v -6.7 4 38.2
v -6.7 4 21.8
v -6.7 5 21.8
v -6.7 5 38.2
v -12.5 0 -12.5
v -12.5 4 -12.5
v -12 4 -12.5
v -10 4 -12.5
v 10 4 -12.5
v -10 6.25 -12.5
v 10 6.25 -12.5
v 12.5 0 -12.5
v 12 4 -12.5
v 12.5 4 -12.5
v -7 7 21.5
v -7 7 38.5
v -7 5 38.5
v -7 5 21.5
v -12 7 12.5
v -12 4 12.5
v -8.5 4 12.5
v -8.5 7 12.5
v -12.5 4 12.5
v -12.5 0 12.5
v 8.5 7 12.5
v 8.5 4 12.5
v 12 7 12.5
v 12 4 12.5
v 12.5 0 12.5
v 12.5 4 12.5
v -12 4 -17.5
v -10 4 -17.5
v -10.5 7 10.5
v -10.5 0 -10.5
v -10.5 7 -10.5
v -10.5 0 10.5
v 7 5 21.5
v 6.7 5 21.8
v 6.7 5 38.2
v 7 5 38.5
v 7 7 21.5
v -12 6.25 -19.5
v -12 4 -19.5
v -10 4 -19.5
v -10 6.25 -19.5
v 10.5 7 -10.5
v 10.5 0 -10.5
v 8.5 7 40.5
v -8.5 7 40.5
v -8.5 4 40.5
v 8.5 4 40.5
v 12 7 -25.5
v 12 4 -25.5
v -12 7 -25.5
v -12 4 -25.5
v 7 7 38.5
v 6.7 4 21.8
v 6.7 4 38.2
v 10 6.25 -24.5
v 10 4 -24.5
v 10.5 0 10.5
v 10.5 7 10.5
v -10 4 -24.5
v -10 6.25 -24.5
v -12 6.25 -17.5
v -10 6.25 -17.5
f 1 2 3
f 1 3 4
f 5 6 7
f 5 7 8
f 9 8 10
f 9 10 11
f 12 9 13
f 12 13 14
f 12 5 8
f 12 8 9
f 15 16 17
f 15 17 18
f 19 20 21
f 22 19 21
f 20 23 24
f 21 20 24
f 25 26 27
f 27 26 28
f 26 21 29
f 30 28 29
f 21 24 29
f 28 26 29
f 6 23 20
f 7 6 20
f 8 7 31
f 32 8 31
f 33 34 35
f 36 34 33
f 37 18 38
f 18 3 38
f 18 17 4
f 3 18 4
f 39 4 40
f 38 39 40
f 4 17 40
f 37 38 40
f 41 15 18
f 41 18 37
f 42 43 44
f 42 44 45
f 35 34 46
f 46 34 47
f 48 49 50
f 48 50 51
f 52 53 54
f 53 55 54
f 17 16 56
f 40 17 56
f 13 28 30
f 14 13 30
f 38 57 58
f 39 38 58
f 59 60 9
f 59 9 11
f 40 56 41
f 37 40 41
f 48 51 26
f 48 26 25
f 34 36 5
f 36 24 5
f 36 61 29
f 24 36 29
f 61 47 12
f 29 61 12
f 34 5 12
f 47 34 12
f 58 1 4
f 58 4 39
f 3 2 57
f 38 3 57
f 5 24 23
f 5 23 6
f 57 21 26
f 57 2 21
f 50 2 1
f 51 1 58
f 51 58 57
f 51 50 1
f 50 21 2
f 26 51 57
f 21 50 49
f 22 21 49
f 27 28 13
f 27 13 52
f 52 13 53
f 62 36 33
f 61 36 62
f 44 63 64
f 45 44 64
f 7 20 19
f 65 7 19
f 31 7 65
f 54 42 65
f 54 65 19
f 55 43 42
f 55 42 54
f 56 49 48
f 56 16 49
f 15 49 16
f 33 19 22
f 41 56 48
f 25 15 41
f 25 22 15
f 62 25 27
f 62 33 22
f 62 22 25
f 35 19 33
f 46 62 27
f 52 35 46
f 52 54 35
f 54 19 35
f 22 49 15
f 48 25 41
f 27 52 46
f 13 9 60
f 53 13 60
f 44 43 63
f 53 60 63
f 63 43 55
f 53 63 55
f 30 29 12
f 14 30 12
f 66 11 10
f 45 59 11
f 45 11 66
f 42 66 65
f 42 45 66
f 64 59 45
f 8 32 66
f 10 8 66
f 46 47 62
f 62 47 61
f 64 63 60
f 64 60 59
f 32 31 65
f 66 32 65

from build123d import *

# Parameters (mm, degrees)
SKETCH1_W           = 25
SKETCH1_H           = 25
BOSS_EXTRUDE1_DEPTH = 4
SKETCH2_W           = 24
SKETCH2_H           = 38
BOSS_EXTRUDE2_DEPTH = 3
SKETCH3_W           = 20
SKETCH3_H           = 2.25
CUT_EXTRUDE1_DEPTH  = 13
SKETCH4_W           = 17
SKETCH4_H           = 3
BOSS_EXTRUDE3_DEPTH = 28
CUT_EXTRUDE2_REACH  = 44.959
SKETCH5_W           = 14
SKETCH5_H           = 17
BOSS_EXTRUDE4_REACH = 48.856
SKETCH6_W           = 1
SKETCH6_H           = 2.25
CUT_EXTRUDE3_REACH  = 49.849
SKETCH7_W           = 2
SKETCH7_H           = 2.25
CUT_EXTRUDE4_REACH  = 44.959
SKETCH9_W           = 21
SKETCH9_H           = 21
SKETCH11_W          = 14
SKETCH11_H          = 17
SKETCH11_W_2        = 13.4
SKETCH11_H_2        = 16.4
BOSS_EXTRUDE5_DEPTH = 1


with BuildPart() as part:
    # Sketch1 → Boss-Extrude1 (new body)
    with BuildSketch(Plane(origin=(0, 0, 0), x_dir=(1, 0, 0), z_dir=(0, 1, 0))):
        Rectangle(SKETCH1_W, SKETCH1_H)
    extrude(amount=BOSS_EXTRUDE1_DEPTH)

    # Sketch2 → Boss-Extrude2 (add)
    with BuildSketch(Plane(origin=(0, 4, 0), x_dir=(1, 0, 0), z_dir=(0, 1, 0))):
        with Locations((0, 6.5)):
            Rectangle(SKETCH2_W, SKETCH2_H)
    extrude(amount=BOSS_EXTRUDE2_DEPTH)

    # Sketch3 → Cut-Extrude1 (cut)
    with BuildSketch(Plane(origin=(0, 0, -25.5), x_dir=(-1, 0, 0), z_dir=(0, 0, -1))):
        with Locations((0, 5.125)):
            Rectangle(SKETCH3_W, SKETCH3_H)
    extrude(amount=-CUT_EXTRUDE1_DEPTH, mode=Mode.SUBTRACT)

    # Sketch4 → Boss-Extrude3 (add)
    with BuildSketch(Plane.XY.offset(12.5)):
        with Locations((0, 5.5)):
            Rectangle(SKETCH4_W, SKETCH4_H)
    extrude(amount=BOSS_EXTRUDE3_DEPTH)

    # Sketch5 → Cut-Extrude2 (cut, up to next)
    with BuildSketch(Plane(origin=(0, 7, 0), x_dir=(1, 0, 0), z_dir=(0, 1, 0)), mode=Mode.PRIVATE) as cut_extrude2_sk1:
        with Locations((0, -30)):
            Rectangle(SKETCH5_W, SKETCH5_H)
    cut_extrude2_tool1 = extrude(cut_extrude2_sk1.sketch, amount=-CUT_EXTRUDE2_REACH, mode=Mode.PRIVATE) & part.part
    add(cut_extrude2_tool1.solids().sort_by_distance((0, 7, 30))[0], mode=Mode.SUBTRACT)

    # Sketch6 → Boss-Extrude4 (add, up to next)
    with BuildSketch(Plane(origin=(-10, 0, 0), x_dir=(0, 0, -1), z_dir=(1, 0, 0)), mode=Mode.PRIVATE) as boss_extrude4_sk1:
        with Locations((25, 5.125)):
            Rectangle(SKETCH6_W, SKETCH6_H)
    boss_extrude4_tool1 = extrude(boss_extrude4_sk1.sketch, amount=BOSS_EXTRUDE4_REACH, mode=Mode.PRIVATE) - part.part
    add(boss_extrude4_tool1.solids().sort_by_distance((-10, 5.125, -25))[0])

    # Sketch7 → Cut-Extrude3 (cut, up to next)
    with BuildSketch(Plane.ZY.offset(12), mode=Mode.PRIVATE) as cut_extrude3_sk1:
        with Locations((-18.5, 5.125)):
            Rectangle(SKETCH7_W, SKETCH7_H)
    cut_extrude3_tool1 = extrude(cut_extrude3_sk1.sketch, amount=-CUT_EXTRUDE3_REACH, mode=Mode.PRIVATE) & part.part
    add(cut_extrude3_tool1.solids().sort_by_distance((-12, 5.125, -18.5))[0], mode=Mode.SUBTRACT)

    # Sketch9 → Cut-Extrude4 (cut, up to next)
    with BuildSketch(Plane.XZ, mode=Mode.PRIVATE) as cut_extrude4_sk1:
        Rectangle(SKETCH9_W, SKETCH9_H)
    cut_extrude4_tool1 = extrude(cut_extrude4_sk1.sketch, amount=-CUT_EXTRUDE4_REACH, mode=Mode.PRIVATE) & part.part
    add(cut_extrude4_tool1.solids().sort_by_distance((0, 0, 0))[0], mode=Mode.SUBTRACT)

    # Sketch11 → Boss-Extrude5 (add)
    with BuildSketch(Plane.XZ.offset(-4)):
        with Locations((0, 30)):
            Rectangle(SKETCH11_W, SKETCH11_H)
        with Locations((0, 30)):
            Rectangle(SKETCH11_W_2, SKETCH11_H_2, mode=Mode.SUBTRACT)
    extrude(amount=-BOSS_EXTRUDE5_DEPTH)


solid = part.part
